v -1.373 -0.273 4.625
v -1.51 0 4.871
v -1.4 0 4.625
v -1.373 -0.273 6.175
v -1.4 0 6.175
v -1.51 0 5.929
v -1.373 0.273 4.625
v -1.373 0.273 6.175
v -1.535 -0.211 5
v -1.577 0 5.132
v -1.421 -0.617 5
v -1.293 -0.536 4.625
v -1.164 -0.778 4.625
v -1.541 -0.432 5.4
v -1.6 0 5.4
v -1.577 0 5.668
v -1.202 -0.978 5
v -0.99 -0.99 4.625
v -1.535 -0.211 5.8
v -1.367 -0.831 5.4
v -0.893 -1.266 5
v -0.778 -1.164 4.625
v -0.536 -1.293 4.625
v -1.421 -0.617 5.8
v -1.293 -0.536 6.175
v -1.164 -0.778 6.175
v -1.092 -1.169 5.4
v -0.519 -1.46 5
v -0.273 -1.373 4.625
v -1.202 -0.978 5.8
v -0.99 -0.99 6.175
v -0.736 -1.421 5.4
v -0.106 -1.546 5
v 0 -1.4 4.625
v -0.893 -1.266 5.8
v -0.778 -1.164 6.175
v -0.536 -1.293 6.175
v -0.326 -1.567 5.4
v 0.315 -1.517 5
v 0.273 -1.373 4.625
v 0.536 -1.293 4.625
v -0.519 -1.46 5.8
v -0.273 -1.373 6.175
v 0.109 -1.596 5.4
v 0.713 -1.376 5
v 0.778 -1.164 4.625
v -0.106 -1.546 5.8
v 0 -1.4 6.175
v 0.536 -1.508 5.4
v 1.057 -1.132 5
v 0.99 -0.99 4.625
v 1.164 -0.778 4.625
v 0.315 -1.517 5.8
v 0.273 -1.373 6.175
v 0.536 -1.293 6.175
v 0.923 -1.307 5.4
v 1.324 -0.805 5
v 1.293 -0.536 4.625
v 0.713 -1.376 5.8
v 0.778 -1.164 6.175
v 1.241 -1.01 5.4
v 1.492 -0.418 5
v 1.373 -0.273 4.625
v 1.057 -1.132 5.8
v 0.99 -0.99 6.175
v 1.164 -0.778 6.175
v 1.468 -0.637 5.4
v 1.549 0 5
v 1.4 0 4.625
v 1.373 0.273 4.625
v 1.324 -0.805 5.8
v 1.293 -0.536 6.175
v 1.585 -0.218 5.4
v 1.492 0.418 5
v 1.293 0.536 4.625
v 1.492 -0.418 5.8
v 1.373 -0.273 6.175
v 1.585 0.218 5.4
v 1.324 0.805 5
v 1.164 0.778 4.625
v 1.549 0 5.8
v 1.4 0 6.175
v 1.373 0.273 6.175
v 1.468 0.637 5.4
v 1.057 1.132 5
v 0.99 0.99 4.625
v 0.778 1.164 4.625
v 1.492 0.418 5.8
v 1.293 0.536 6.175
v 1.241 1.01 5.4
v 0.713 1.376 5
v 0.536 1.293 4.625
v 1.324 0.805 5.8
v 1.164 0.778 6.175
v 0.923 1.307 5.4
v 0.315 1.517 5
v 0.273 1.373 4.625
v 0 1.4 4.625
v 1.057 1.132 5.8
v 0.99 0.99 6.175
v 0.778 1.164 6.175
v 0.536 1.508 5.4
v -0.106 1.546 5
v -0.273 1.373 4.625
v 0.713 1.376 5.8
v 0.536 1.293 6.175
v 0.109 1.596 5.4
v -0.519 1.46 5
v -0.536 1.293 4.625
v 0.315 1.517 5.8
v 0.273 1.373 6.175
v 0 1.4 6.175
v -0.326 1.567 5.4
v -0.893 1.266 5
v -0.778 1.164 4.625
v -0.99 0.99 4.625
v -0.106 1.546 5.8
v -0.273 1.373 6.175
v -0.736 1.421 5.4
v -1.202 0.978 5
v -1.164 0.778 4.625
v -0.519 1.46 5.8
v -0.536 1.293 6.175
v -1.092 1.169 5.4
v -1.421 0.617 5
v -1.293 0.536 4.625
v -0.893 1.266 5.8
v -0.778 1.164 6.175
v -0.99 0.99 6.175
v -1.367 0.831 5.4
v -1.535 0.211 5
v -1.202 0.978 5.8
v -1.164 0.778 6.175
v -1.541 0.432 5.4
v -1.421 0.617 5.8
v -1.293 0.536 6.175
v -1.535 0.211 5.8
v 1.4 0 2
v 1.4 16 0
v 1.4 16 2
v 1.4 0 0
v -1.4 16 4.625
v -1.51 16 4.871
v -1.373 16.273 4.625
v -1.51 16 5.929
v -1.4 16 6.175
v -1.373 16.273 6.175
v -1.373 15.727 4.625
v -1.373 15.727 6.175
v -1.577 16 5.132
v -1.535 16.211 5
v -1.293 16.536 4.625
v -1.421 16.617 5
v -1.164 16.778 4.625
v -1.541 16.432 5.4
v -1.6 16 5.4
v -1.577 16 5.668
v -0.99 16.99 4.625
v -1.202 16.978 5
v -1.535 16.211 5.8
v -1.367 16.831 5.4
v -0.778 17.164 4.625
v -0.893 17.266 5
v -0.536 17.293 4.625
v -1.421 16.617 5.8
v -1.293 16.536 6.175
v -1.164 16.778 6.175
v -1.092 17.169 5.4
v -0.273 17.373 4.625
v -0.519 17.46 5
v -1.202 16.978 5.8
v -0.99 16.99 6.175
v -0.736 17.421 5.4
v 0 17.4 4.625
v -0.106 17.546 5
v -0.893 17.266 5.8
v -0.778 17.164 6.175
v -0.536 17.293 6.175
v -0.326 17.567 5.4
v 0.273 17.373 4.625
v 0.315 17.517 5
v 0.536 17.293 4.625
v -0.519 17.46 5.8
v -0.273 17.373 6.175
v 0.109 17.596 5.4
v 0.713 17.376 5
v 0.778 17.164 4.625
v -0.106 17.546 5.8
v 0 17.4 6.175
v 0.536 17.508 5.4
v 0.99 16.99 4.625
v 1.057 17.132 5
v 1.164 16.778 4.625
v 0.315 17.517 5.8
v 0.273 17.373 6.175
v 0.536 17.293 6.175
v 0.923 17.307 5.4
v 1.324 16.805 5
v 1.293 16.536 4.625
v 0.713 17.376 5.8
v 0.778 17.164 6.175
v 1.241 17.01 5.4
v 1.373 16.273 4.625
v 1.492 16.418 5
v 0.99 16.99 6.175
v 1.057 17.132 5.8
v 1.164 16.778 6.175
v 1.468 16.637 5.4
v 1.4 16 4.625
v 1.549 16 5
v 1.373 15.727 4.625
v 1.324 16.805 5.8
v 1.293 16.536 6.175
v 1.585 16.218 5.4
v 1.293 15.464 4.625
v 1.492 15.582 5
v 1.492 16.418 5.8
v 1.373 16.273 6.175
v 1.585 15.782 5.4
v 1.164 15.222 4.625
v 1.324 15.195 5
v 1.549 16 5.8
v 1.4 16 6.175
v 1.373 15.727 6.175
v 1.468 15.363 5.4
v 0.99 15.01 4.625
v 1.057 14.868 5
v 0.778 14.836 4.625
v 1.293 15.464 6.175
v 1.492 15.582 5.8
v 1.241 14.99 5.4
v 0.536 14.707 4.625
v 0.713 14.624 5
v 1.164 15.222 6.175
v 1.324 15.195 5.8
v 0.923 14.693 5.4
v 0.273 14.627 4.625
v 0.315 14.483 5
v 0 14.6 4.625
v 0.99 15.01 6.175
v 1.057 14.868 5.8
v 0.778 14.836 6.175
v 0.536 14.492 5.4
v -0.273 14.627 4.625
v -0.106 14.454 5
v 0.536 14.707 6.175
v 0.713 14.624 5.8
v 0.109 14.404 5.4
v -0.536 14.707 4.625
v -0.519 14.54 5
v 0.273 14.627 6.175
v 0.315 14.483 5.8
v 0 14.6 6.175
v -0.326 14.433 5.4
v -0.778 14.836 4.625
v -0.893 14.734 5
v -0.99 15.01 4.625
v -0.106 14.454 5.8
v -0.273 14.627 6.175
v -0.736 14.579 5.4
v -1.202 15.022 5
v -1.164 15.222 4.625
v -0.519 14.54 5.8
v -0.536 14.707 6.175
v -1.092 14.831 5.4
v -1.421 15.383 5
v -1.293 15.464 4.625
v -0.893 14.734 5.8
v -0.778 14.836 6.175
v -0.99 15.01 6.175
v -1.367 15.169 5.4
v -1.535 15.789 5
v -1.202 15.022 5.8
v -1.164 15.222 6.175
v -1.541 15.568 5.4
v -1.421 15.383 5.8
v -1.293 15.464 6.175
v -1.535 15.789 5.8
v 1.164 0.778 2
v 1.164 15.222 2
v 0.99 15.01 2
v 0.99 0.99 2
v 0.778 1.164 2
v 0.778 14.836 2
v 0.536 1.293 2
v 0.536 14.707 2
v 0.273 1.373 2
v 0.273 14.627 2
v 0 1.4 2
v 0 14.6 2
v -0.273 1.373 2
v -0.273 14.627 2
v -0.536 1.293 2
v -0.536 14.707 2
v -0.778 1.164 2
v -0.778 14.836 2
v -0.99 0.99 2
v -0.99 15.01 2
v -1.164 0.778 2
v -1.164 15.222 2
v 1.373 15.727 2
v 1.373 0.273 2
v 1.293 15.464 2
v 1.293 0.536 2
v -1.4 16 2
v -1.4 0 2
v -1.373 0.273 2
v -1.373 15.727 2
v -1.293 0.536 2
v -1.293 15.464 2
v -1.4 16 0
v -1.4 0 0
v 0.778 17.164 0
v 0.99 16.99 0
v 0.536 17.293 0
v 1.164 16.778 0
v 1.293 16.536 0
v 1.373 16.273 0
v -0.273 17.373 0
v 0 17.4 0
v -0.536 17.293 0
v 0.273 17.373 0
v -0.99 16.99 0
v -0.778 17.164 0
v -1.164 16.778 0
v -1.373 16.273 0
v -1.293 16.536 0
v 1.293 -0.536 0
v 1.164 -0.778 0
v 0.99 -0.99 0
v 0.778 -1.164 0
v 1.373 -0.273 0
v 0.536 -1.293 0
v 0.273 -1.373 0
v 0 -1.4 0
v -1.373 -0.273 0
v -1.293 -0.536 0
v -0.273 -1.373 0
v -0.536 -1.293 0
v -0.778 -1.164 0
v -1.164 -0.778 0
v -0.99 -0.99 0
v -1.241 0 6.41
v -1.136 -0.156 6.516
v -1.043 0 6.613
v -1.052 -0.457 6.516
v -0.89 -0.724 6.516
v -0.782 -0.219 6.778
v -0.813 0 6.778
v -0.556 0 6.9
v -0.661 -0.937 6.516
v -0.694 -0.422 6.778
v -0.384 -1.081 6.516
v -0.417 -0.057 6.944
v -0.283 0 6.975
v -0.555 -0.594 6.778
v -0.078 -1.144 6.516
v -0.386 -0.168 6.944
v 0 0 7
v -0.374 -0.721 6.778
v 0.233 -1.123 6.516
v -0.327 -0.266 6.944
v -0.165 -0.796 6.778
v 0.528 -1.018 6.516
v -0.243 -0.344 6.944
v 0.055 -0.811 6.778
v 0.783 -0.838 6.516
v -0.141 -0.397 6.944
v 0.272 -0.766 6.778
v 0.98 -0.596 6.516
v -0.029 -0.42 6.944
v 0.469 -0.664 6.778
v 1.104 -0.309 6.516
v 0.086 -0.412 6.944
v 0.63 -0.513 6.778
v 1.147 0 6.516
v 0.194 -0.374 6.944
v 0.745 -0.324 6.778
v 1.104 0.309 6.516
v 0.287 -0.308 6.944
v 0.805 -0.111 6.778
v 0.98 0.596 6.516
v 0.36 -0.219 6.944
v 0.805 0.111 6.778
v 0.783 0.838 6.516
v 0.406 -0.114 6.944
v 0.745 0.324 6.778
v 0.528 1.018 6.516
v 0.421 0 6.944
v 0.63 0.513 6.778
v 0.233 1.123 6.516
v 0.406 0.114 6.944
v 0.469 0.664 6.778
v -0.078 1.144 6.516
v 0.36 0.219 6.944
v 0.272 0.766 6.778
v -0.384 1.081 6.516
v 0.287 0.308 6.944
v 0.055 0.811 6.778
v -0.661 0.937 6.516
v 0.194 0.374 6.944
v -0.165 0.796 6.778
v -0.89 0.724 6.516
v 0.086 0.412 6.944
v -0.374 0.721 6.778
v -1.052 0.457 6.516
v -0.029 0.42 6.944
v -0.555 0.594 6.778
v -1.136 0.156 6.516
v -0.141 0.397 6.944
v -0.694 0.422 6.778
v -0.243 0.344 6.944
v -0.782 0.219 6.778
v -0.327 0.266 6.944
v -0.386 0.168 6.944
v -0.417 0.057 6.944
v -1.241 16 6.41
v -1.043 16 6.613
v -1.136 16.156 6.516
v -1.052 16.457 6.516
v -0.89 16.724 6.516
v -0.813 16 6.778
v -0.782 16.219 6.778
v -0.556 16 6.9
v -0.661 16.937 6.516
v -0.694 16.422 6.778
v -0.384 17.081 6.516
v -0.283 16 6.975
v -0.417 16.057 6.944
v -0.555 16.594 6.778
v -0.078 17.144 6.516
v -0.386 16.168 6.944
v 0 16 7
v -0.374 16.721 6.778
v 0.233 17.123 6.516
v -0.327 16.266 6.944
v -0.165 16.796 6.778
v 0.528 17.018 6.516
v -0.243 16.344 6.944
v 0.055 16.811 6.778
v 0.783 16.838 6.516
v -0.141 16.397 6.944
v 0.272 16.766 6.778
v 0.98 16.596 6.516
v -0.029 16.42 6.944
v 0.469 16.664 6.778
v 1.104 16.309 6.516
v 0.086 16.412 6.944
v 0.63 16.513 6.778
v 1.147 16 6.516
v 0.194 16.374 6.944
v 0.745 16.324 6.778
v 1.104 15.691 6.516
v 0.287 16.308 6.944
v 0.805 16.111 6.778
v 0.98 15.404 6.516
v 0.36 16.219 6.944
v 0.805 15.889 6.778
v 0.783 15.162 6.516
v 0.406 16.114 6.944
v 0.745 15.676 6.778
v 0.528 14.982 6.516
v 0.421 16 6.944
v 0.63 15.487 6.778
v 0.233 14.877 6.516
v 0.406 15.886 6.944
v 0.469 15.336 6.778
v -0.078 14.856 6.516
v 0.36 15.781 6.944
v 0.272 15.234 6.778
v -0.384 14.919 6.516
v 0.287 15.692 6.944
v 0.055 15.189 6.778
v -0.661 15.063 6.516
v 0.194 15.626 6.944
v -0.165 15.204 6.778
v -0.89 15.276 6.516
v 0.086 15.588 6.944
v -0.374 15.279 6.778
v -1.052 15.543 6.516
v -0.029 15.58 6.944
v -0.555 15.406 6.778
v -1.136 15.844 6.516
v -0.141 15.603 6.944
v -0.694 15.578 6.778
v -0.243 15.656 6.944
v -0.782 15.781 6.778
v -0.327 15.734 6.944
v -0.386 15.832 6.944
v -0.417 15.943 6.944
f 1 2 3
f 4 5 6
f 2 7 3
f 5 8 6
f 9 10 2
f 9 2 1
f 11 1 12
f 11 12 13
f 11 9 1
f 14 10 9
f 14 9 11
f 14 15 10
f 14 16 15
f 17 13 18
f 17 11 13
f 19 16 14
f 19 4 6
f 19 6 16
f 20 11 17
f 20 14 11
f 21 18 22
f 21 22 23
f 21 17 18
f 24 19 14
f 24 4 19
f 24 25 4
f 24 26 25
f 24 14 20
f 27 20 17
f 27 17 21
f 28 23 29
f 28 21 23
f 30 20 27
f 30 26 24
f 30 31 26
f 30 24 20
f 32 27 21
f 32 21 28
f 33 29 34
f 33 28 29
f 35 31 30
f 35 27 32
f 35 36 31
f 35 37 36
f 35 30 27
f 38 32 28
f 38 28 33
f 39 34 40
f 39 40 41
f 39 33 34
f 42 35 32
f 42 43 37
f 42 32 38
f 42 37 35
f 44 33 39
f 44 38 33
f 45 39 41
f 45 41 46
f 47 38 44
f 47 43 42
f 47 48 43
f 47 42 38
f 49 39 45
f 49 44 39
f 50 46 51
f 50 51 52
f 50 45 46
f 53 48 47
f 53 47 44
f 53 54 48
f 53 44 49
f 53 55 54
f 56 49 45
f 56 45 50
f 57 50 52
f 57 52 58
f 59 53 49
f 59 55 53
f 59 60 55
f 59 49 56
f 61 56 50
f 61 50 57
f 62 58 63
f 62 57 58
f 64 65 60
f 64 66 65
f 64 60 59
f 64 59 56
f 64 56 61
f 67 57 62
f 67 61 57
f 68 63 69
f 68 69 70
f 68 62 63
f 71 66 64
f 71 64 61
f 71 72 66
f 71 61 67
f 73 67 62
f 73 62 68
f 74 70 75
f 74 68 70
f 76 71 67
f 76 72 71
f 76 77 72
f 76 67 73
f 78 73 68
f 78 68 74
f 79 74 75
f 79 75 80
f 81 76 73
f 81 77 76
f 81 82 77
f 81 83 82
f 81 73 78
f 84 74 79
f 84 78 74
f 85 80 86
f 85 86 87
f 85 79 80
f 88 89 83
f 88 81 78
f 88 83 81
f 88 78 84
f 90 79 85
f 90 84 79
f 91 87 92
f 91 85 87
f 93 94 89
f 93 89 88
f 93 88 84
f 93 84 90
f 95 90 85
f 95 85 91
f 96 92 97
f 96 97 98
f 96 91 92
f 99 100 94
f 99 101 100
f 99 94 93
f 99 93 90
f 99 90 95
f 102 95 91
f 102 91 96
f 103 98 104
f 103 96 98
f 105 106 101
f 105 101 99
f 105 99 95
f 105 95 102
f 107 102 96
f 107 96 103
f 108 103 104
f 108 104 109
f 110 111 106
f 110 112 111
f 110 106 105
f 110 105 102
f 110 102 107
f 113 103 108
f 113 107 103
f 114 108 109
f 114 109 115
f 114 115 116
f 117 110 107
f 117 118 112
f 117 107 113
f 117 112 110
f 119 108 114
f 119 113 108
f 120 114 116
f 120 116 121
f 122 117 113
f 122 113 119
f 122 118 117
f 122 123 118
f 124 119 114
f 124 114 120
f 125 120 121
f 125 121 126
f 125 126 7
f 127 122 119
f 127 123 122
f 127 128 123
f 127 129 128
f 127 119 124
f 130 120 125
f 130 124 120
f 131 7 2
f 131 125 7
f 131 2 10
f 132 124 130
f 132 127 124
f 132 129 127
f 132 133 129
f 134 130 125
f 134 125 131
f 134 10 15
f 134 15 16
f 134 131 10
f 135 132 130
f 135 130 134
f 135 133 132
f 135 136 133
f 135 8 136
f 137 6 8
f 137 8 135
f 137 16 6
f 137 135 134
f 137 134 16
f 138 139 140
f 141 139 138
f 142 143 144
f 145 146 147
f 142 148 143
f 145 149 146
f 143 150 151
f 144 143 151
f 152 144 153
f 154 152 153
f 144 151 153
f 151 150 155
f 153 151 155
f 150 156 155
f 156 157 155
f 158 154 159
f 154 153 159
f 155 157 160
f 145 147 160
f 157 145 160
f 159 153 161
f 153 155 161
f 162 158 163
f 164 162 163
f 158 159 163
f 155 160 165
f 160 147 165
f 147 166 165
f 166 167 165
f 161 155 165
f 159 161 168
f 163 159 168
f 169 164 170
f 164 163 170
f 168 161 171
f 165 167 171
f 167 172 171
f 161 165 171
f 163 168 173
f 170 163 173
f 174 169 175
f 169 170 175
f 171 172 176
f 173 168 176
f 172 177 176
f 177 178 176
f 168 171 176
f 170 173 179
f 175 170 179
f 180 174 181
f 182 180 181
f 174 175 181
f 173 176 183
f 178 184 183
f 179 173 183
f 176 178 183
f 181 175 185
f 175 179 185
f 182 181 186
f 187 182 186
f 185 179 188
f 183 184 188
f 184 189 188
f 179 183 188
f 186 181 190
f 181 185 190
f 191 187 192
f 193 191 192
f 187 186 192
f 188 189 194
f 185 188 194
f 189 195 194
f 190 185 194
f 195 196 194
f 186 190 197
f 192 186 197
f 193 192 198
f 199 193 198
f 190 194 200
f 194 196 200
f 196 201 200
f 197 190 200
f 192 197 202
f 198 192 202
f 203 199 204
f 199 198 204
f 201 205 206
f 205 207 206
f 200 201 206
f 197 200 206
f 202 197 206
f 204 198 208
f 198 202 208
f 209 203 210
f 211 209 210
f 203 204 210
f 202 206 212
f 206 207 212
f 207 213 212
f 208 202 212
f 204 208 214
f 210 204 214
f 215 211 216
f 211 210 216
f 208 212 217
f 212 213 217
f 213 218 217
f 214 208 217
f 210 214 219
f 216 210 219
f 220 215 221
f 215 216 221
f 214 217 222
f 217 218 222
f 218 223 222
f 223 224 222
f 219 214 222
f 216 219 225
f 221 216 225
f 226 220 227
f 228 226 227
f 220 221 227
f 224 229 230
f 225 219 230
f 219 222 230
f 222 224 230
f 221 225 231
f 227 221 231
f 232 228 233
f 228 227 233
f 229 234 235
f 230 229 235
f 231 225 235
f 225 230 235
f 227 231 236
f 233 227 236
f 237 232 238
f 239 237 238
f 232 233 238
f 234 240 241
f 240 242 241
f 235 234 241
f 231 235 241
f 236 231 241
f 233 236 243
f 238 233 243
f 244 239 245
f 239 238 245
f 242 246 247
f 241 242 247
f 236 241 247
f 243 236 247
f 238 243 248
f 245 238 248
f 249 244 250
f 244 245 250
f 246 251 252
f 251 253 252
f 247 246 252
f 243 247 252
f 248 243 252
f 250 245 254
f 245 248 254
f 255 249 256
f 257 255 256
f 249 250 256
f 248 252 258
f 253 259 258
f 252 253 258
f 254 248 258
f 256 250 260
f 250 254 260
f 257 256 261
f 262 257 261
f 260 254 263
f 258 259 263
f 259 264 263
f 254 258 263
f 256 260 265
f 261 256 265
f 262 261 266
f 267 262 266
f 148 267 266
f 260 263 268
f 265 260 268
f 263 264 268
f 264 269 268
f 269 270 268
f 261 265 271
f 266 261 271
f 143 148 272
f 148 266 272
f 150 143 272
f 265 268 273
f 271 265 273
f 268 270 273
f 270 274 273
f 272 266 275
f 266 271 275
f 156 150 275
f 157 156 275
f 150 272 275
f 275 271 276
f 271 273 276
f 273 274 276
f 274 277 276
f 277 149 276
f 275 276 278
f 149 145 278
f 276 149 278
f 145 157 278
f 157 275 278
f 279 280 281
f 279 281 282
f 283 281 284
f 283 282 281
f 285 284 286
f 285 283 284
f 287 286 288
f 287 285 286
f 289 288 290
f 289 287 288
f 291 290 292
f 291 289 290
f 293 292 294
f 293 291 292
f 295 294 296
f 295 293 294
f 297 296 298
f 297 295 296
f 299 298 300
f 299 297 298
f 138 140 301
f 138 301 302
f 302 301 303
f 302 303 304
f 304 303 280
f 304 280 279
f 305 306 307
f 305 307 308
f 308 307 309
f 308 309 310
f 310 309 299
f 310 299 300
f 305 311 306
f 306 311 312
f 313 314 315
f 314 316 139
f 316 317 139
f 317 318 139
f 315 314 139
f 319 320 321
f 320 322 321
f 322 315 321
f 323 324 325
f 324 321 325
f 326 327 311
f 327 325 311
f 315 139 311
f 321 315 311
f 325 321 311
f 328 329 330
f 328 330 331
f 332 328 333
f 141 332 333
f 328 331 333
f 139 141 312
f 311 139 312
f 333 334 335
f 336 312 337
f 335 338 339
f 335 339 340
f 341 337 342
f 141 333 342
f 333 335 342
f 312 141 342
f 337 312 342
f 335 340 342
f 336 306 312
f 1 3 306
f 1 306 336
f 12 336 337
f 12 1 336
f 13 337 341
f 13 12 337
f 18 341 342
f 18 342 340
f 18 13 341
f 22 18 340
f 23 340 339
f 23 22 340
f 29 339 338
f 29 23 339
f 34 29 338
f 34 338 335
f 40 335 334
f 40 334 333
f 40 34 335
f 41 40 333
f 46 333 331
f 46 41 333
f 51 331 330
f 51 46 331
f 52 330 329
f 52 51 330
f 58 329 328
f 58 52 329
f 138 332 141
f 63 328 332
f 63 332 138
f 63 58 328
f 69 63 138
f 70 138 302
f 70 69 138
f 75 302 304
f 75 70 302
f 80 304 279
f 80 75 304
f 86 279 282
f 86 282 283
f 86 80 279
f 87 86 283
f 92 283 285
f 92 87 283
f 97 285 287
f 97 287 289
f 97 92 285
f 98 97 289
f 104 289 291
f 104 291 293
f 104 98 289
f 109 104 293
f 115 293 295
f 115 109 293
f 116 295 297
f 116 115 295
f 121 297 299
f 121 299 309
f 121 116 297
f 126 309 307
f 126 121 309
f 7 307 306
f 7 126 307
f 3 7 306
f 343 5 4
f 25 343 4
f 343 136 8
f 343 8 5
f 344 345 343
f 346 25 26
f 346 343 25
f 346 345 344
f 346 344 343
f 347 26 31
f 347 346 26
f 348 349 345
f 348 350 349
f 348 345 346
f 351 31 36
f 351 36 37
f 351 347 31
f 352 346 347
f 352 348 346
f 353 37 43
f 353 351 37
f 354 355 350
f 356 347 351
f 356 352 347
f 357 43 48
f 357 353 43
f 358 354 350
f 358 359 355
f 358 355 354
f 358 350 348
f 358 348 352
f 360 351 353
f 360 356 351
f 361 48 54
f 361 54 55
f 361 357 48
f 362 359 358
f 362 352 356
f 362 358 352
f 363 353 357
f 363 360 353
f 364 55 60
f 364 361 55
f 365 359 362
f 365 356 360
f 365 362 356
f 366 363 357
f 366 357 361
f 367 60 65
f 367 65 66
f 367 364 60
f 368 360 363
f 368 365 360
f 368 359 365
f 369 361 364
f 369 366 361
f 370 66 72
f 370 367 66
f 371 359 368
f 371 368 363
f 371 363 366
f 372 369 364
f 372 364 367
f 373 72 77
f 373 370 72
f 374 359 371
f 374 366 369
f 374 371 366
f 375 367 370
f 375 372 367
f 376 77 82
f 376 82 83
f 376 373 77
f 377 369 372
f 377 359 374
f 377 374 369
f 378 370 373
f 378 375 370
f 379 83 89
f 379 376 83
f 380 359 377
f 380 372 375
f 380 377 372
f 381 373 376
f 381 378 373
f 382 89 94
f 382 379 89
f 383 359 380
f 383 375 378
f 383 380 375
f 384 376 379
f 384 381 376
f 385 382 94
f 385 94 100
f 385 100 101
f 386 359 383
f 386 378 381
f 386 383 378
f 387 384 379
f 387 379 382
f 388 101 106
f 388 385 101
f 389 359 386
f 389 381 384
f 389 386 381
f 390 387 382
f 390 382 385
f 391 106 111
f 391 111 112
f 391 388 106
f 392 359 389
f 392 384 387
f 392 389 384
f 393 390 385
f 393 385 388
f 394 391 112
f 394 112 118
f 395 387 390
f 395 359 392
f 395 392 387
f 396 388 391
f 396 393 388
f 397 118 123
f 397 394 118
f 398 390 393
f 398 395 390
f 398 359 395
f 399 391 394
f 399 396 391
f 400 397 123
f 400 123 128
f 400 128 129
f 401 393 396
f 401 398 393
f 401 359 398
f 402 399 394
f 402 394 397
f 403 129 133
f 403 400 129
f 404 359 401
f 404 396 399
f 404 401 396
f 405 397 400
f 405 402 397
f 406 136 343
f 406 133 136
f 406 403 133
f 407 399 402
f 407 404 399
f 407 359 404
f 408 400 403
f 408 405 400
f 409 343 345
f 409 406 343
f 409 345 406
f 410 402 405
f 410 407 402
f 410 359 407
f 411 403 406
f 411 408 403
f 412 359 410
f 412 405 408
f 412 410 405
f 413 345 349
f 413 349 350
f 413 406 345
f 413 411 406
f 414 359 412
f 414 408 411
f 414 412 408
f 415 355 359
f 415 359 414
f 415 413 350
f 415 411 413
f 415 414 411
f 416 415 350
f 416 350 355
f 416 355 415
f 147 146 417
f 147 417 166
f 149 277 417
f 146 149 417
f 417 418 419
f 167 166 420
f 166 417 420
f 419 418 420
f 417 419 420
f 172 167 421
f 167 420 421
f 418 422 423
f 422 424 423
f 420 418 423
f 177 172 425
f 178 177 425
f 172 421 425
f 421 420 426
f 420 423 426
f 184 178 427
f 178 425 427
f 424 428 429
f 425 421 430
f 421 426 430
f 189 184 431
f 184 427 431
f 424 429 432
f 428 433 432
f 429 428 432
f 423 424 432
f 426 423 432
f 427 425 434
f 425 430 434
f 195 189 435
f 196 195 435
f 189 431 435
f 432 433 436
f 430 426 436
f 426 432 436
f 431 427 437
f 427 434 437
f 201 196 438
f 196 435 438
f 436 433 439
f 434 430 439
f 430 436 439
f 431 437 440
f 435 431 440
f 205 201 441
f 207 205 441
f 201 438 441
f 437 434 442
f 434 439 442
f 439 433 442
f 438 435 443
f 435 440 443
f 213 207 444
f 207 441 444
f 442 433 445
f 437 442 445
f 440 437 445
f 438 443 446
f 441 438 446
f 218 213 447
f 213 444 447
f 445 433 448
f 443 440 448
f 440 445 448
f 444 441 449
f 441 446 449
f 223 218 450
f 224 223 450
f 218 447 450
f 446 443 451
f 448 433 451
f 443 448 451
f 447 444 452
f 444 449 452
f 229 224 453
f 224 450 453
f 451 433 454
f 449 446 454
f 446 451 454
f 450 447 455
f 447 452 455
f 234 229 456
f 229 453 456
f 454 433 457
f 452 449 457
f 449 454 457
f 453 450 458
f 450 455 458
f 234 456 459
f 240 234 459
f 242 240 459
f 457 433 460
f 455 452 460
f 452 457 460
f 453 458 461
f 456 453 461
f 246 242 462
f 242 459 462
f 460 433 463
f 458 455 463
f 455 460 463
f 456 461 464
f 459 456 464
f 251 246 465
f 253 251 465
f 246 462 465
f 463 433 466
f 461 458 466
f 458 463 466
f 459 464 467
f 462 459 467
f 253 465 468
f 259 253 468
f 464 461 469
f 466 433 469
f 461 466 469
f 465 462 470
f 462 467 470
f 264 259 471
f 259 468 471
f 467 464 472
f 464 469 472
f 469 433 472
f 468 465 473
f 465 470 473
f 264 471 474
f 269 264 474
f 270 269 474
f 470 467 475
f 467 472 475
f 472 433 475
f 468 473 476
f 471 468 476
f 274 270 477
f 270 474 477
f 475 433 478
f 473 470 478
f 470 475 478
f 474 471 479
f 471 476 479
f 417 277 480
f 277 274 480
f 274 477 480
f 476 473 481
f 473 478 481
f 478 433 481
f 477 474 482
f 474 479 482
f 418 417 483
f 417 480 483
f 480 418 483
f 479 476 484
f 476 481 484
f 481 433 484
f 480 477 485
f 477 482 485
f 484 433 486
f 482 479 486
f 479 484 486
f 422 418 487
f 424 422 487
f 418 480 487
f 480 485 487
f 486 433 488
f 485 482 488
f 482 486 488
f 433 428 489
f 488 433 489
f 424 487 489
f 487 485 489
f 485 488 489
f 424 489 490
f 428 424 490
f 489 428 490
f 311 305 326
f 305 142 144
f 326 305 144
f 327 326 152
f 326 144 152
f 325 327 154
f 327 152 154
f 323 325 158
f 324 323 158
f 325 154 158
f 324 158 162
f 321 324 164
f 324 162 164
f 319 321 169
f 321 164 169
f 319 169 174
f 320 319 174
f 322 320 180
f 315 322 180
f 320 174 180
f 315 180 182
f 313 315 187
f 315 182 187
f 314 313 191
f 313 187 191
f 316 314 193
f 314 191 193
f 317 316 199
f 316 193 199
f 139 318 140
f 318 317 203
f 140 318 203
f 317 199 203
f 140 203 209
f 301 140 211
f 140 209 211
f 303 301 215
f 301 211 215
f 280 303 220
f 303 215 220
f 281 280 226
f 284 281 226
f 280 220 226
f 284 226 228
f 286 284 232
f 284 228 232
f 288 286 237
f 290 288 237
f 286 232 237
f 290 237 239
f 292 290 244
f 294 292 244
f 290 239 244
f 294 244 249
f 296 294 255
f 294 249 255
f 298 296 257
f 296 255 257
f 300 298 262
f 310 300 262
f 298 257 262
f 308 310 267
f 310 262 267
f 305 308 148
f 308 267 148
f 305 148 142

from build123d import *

# Parameters (mm, degrees)
SKETCH_5_W      = 2.8
SKETCH_5_H      = 8
EXTRUDE_1_DEPTH = 2


with BuildPart() as part:
    # 草图4 → 旋转1 (revolve)
    with BuildSketch(Plane(origin=(0, 0, 0), x_dir=(1, 0, 0), z_dir=(0, 1, 0))):
        with BuildLine():
            Line((0, -3.8), (0, 0))
            Line((0, 0), (-1.4, 0))
            Line((-1.4, 0), (-1.4, -4.625403331))
            ThreePointArc((-1.4, -4.625403331), (-0.812602403, -4.021712173), (0, -3.8))
        make_face()
        with BuildLine():
            Line((-1.4, -6.174596669), (-1.4, -4.625403331))
            ThreePointArc((-1.4, -4.625403331), (-1.6, -5.4), (-1.4, -6.174596669))
        make_face()
        with BuildLine():
            Line((0, -7), (0, -3.8))
            ThreePointArc((0, -3.8), (-0.812602403, -4.021712173), (-1.4, -4.625403331))
            Line((-1.4, -4.625403331), (-1.4, -6.174596669))
            ThreePointArc((-1.4, -6.174596669), (-0.812602403, -6.778287827), (0, -7))
        make_face()
    revolve(axis=Axis((0, 0, -1.647649903), (0, 0, 1)))

    # 草图5 → 凸台-拉伸1 (add)
    with BuildSketch(Plane(origin=(0, 0, 0), x_dir=(-1, 0, 0), z_dir=(0, 0, -1))):
        with Locations((0, 4)):
            Rectangle(SKETCH_5_W, SKETCH_5_H)
    extrude(amount=-EXTRUDE_1_DEPTH)

    # 镜向1: part across plane


with BuildPart() as part_1:
    add(part.part)
    add(part.part.mirror(Plane(origin=(1.4, 8, 2), x_dir=(0, 0, 1), z_dir=(0, 1, 0))))


solid = part_1.part
